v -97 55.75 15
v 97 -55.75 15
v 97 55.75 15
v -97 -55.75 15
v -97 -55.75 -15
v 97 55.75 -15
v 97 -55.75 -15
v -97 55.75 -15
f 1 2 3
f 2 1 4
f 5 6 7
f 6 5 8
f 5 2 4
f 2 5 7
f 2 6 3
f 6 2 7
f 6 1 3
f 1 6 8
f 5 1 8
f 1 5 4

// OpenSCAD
//Screen Dimensions:

largo=194;
ancho=110+1.5;
//(including standoffs)
thick=20+10; 
espesor=1;

//Viewable screen size:
toleranciaPantalla=5;
pantallaLago=155;
pantallAncho=86;

//panel Solar:
largoPanel=190;
anchoPanel=84;


cube([largo,ancho,thick],center=true);
